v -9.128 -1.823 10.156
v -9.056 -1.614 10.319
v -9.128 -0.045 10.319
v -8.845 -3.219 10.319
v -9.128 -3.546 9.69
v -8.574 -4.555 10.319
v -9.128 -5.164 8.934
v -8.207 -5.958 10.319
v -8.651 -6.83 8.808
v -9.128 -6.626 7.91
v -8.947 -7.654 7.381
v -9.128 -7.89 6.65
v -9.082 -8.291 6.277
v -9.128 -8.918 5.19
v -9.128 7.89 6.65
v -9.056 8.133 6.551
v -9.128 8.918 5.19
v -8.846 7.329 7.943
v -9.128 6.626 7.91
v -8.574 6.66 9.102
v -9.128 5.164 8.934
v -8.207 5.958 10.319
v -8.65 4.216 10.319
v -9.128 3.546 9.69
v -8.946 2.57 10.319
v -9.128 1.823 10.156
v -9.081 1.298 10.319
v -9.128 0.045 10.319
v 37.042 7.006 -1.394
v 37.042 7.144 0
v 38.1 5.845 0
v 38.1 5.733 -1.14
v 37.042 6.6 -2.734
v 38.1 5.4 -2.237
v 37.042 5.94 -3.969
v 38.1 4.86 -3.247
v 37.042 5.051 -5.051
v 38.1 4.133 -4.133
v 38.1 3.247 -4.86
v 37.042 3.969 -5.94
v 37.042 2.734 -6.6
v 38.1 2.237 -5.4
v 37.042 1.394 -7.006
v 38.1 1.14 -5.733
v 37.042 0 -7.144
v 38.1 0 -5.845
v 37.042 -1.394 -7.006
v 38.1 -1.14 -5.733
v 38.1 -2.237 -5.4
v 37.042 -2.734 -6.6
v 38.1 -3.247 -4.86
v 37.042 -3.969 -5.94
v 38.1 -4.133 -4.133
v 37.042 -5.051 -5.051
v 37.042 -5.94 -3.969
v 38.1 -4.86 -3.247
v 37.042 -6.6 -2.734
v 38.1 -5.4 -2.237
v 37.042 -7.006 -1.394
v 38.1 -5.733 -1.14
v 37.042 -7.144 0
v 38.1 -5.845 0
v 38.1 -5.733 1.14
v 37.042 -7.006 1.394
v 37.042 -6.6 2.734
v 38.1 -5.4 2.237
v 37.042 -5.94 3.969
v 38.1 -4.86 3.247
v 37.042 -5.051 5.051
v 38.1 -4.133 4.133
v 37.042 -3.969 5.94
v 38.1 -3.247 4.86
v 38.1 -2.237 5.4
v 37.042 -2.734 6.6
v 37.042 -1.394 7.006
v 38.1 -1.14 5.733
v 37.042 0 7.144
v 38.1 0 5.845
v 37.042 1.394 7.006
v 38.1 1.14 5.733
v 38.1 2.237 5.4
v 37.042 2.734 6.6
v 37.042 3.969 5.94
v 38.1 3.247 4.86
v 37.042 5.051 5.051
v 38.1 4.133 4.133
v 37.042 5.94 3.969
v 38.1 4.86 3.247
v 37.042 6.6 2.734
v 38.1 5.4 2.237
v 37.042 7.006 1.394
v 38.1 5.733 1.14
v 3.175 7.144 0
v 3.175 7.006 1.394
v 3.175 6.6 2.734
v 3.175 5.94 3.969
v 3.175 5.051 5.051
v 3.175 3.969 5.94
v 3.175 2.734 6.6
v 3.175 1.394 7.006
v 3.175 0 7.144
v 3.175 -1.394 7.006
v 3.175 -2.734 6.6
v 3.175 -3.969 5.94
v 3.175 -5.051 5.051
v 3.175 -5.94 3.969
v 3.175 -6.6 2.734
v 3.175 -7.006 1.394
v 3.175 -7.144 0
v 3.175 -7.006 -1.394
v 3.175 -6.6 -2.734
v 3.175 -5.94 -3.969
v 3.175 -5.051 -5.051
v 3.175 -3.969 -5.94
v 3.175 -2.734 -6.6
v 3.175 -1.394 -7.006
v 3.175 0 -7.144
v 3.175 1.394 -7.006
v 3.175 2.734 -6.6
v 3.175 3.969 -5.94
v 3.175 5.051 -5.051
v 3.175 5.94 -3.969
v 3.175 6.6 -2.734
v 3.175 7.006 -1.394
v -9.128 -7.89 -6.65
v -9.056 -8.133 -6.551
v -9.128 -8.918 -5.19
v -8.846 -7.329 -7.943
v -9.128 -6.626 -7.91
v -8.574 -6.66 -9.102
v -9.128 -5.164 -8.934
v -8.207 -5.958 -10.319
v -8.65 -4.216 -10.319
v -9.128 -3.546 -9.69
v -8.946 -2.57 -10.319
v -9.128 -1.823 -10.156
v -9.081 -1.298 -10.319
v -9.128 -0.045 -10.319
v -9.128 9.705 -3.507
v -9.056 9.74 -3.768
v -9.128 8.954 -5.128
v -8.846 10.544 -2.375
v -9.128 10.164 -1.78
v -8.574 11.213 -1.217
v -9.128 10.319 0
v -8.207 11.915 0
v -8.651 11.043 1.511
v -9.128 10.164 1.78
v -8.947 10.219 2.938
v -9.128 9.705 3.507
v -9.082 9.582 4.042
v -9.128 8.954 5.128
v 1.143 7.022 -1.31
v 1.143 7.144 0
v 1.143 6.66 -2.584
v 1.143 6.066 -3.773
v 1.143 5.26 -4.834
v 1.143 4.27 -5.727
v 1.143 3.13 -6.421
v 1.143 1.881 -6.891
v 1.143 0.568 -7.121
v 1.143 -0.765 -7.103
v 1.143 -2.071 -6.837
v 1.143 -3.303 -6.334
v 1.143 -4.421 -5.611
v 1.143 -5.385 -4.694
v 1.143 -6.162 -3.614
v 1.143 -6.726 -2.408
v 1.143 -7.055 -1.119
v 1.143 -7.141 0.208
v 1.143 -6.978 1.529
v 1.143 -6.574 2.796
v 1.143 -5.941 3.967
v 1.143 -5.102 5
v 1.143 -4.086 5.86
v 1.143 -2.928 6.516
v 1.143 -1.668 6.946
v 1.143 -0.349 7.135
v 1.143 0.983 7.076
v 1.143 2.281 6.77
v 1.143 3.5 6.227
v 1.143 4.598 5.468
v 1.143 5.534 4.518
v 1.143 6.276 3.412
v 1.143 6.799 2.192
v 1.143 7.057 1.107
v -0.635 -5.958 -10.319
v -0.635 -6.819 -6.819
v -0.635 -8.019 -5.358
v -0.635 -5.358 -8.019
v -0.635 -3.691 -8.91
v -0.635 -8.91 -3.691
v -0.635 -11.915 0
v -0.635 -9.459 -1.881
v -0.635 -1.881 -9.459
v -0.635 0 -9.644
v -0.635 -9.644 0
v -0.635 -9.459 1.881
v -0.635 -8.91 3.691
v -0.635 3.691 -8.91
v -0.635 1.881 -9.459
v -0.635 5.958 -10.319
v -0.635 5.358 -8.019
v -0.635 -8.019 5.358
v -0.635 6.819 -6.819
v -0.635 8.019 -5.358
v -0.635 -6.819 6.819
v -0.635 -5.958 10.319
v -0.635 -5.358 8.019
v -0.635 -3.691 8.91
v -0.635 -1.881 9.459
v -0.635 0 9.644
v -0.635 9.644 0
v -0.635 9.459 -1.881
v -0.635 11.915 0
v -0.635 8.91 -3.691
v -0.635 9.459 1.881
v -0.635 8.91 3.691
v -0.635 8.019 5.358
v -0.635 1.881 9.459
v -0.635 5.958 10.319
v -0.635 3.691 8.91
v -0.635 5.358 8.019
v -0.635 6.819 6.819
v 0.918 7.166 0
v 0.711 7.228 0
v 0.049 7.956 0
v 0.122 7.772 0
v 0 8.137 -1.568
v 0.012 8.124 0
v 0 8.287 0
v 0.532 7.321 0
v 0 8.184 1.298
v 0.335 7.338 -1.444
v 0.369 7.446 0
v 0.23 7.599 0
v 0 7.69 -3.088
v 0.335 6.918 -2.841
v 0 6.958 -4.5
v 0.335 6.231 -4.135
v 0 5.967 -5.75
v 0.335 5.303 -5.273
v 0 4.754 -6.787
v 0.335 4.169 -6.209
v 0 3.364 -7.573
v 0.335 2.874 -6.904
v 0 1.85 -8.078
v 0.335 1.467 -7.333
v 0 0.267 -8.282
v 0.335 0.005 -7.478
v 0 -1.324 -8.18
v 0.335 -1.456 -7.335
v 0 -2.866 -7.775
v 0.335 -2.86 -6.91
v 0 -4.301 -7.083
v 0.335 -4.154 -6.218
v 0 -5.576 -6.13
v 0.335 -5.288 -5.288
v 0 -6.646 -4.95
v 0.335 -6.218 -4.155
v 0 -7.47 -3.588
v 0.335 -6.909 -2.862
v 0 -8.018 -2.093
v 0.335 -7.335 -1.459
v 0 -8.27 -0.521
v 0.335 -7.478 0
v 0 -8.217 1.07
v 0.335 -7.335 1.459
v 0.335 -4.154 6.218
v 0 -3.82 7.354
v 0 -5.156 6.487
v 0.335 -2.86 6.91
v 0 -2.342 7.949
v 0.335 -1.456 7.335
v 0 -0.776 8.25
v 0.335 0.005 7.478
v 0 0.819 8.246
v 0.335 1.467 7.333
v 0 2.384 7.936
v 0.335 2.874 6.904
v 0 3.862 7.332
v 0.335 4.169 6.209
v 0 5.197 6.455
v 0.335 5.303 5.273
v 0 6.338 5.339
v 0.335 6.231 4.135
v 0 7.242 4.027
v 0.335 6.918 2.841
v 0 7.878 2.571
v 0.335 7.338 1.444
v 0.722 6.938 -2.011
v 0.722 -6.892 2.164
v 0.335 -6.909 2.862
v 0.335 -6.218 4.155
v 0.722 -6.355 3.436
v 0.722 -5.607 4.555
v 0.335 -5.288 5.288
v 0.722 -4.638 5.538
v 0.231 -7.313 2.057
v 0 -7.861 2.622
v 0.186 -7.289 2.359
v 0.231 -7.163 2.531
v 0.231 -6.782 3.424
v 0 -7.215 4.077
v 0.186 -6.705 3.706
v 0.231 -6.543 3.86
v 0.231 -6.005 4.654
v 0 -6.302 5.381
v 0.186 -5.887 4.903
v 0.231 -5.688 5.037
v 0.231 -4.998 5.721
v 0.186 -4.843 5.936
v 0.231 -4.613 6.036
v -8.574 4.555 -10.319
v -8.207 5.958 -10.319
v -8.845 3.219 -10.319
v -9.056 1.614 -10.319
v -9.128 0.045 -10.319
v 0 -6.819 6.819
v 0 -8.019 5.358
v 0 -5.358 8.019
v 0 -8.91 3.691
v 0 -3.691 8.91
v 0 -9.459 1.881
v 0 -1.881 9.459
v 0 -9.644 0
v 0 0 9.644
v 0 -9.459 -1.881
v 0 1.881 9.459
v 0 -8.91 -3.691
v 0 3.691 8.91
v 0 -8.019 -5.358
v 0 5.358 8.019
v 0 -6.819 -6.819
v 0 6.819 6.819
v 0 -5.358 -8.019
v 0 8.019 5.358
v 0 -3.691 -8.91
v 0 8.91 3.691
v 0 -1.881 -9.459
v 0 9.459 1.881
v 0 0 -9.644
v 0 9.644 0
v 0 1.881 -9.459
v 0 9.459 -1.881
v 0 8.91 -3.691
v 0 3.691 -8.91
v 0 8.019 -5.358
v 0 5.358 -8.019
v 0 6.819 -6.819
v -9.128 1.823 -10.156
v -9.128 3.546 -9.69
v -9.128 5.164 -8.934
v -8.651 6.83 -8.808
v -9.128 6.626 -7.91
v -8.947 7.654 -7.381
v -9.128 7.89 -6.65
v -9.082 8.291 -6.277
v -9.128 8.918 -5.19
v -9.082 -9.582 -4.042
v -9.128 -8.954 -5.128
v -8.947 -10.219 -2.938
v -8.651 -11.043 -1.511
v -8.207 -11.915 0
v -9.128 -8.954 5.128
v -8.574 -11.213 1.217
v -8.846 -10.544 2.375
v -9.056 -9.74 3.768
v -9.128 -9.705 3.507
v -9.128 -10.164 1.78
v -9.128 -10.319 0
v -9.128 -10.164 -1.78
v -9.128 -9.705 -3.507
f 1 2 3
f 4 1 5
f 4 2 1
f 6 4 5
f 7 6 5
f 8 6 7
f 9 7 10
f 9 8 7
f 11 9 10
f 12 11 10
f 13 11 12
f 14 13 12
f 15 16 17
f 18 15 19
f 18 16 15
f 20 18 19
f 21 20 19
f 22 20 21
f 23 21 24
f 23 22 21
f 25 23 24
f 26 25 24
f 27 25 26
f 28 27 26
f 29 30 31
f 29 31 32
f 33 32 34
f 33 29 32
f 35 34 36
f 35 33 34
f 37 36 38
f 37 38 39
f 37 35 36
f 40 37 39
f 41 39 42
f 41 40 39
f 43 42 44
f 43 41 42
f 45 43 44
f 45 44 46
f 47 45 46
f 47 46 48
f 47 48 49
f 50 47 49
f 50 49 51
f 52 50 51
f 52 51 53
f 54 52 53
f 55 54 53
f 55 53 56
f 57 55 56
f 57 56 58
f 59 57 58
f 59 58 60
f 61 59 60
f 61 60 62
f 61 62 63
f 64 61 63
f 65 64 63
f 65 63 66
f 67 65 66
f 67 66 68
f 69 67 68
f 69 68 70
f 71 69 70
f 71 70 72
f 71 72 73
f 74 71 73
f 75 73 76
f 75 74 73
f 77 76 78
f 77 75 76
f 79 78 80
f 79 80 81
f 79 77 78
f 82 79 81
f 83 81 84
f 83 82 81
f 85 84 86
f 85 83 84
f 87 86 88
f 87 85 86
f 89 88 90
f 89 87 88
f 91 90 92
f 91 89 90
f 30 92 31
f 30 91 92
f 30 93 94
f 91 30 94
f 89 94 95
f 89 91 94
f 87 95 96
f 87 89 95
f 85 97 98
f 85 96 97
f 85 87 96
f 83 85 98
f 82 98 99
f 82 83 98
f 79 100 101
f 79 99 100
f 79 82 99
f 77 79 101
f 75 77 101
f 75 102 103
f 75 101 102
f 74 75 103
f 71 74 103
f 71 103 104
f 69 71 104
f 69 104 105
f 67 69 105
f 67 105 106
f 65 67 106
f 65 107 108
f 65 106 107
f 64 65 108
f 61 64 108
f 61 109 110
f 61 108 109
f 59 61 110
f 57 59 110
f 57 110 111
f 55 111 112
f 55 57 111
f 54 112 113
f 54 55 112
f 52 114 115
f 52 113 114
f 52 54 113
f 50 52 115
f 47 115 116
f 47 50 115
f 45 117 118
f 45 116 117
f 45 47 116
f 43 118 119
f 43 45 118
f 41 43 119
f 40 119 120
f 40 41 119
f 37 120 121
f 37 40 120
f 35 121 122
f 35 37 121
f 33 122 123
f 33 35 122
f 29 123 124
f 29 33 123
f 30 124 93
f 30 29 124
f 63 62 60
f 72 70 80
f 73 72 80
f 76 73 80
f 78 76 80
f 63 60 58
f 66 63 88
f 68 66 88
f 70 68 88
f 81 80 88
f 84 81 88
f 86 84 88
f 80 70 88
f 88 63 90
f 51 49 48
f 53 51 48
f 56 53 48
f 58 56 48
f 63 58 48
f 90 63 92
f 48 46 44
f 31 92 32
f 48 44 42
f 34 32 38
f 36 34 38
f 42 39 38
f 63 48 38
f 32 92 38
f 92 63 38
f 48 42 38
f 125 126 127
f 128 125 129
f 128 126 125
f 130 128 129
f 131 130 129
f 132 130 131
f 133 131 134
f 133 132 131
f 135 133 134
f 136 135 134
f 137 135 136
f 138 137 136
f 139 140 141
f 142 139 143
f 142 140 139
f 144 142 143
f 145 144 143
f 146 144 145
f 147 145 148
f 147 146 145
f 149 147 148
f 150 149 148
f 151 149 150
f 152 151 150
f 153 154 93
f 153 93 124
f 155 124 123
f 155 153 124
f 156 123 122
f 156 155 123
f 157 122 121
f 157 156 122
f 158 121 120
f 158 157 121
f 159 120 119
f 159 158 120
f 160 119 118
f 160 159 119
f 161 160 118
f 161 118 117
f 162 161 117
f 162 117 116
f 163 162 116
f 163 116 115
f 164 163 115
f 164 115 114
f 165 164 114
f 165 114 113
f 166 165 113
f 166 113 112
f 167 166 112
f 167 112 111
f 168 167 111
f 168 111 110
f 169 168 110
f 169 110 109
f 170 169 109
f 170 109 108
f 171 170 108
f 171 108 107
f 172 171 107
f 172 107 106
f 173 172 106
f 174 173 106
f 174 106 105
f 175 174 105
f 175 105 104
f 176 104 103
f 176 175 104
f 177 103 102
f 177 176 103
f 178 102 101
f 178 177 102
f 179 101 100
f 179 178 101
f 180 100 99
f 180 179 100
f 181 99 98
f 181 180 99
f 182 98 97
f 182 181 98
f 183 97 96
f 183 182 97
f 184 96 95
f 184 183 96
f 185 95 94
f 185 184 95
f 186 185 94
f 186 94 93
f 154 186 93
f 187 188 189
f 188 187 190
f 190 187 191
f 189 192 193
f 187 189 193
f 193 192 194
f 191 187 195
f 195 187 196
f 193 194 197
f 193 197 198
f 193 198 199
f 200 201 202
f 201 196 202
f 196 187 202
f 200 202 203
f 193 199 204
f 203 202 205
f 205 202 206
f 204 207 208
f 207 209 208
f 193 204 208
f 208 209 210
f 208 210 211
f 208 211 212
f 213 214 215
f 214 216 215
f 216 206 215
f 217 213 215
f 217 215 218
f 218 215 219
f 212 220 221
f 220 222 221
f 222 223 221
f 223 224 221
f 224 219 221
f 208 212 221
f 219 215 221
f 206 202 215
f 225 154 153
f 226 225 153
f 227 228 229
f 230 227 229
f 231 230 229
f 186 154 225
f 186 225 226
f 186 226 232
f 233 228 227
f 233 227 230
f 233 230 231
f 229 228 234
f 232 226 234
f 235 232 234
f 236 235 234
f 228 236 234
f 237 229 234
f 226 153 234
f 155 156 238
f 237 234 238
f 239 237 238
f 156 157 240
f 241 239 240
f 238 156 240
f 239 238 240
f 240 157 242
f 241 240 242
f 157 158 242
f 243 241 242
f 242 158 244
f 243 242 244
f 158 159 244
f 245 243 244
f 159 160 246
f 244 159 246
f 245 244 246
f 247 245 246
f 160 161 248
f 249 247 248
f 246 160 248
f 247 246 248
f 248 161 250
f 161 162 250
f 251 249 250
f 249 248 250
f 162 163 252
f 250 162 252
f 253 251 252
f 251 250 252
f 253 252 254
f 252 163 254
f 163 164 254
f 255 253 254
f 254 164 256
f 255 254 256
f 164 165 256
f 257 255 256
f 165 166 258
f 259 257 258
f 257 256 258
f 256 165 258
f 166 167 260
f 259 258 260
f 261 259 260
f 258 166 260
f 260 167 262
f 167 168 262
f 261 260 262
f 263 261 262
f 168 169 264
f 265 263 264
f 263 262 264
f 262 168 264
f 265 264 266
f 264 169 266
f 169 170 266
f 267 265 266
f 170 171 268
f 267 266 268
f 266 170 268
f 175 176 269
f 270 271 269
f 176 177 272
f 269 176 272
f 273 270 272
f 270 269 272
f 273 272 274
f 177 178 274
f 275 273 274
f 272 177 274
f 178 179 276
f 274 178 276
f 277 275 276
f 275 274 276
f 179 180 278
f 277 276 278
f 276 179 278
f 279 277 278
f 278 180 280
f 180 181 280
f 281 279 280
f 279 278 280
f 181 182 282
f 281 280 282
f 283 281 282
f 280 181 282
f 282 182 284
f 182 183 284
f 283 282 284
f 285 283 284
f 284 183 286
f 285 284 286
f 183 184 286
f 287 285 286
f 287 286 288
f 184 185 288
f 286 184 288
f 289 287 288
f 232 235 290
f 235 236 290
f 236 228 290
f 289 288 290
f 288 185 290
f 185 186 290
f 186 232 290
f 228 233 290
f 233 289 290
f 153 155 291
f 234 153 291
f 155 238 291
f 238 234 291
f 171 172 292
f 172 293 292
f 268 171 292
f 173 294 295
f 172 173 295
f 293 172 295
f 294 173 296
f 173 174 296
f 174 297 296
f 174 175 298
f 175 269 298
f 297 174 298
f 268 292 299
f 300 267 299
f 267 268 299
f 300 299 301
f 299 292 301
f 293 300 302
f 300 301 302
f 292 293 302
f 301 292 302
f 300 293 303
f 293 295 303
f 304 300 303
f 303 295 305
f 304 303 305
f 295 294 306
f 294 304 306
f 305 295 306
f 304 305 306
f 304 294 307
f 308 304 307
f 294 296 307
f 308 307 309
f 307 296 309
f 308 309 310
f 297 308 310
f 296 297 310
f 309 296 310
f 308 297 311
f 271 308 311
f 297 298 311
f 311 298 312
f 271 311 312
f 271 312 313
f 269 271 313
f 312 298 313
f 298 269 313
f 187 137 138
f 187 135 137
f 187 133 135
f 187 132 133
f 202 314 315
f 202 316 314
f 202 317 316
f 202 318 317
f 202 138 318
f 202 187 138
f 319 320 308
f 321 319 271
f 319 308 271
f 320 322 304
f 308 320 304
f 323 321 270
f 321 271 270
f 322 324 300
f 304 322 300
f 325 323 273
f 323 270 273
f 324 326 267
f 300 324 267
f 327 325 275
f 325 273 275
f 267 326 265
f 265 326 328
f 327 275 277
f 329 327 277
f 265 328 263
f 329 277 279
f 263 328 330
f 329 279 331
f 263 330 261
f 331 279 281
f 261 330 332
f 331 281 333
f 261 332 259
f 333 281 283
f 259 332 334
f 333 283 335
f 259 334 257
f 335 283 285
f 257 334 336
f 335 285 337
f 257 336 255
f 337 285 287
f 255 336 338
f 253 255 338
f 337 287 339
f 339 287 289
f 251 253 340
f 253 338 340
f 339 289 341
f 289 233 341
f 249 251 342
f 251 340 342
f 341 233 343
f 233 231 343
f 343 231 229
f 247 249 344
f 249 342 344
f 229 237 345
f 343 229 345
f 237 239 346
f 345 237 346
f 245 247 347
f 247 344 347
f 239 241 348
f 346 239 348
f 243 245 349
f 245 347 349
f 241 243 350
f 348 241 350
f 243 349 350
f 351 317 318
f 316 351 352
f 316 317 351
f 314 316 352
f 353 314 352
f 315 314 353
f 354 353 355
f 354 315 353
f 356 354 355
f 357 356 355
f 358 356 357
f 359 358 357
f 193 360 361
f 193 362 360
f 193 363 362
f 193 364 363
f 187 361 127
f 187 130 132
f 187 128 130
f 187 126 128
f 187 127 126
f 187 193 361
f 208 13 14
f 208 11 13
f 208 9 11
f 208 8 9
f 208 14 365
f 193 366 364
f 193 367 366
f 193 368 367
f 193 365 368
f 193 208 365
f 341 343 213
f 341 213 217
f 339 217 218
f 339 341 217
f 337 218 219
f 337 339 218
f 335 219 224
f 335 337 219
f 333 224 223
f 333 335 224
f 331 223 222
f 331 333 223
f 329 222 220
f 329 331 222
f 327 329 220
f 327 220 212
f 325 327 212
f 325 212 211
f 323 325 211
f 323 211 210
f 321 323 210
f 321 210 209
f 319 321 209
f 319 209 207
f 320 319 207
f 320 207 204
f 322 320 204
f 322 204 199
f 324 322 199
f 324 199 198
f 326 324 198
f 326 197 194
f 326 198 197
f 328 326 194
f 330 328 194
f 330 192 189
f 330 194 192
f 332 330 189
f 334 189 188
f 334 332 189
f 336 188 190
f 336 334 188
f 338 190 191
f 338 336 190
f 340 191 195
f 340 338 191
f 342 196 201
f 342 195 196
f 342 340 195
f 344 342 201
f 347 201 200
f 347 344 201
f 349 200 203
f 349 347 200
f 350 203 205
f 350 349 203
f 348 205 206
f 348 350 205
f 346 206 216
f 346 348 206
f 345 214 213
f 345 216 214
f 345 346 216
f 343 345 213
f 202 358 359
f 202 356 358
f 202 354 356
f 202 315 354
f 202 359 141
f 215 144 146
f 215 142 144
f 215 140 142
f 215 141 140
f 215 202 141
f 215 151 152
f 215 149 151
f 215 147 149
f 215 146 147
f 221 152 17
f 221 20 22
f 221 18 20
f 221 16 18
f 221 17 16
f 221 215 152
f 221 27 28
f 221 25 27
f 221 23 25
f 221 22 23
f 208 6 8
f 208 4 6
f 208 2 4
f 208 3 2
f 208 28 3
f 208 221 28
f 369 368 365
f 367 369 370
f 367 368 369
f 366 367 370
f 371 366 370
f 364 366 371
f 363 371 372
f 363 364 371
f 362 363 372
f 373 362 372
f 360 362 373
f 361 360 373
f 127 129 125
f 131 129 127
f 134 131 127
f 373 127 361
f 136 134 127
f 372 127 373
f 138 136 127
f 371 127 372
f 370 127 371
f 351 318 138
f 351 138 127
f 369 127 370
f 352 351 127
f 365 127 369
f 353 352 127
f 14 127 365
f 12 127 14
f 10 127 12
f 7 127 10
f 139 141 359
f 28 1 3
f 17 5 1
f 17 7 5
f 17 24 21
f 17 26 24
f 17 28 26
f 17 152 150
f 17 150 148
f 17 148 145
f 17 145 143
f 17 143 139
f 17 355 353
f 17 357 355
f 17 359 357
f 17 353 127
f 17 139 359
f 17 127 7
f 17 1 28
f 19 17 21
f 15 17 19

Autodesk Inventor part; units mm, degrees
ref_plane "YZ Plane" through (0, 0, 0) normal (1, 0, 0) x (0, 1, 0)
ref_plane "XZ Plane" through (0, 0, 0) normal (0, 1, 0) x (-1, 0, 0)
sketch "Sketch1" plane through (0, 0, 0) normal (0, 0, 1) x (1, 0, 0)
  line L0 (0, 9.6441) -> (0, 7.1437)
  line L1 (3.175, 7.1437) -> (38.1, 7.1438)
  line L2 (38.1, 7.1438) -> (38.1, 0)
  line L3 (38.1, 0) -> (-0.6351, 0)
  line L4 (-8.3821, 0) -> (45.847, 0) projected
  line L5 (-0.6351, 0) -> (-0.6351, 9.6441)
  line L6 (-0.6351, 9.6441) -> (0, 9.6441)
  line L7 (3.175, 7.1437) -> (1.0582, 7.1437)
  line L8 (1.0582, 7.1437) -> (0, 7.1437)
  line L9 (0, -1.9288) -> (0, 11.5729) projected
  dimension "d0" = 38.1
  dimension "d1" = 34.925
  dimension "d2" = 14.2875
  dimension "d9" = 0.6351
  dimension "d10" = 19.2881
  dimension "d13" = 2.1168
  dimension "d14" = 14.2875
revolve "Body" add sketch "Sketch1" angle 360 about axis through (38.1, 0, 0) along (-1, 0, 0)
sketch "Sketch2" plane through (-0.6351, 0, 0) normal (-1, 0, 0) x (0, 0, 1)
  line L0 (0, 11.9151) -> (10.3187, 5.9575)
  line L1 (10.3187, 5.9575) -> (10.3187, -5.9575)
  line L2 (10.3187, -5.9575) -> (0, -11.9151)
  line L3 (0, -11.9151) -> (-10.3187, -5.9575)
  line L4 (-10.3187, -5.9575) -> (-10.3187, 5.9575)
  line L5 (-10.3187, 5.9575) -> (0, 11.9151)
  point P0 (0, 0)
  point P1 (0, 0)
  dimension "d11" = 20.6375
extrude "Head" add sketch "Sketch2" along normal blind 8.4931
sketch "Sketch4" plane through (0, 0, 0) normal (0, 0, 1) x (1, 0, 0)
  line L0 (-9.1282, 10.3188) -> (-9.1282, 11.9151)
  line L1 (-9.1282, 11.9151) -> (-8.2066, 11.9151)
  line L2 (-8.2066, 11.9151) -> (-9.1282, 10.3188)
  line L3 (-10.8269, 0) -> (1.0635, 0) projected
  line L4 (-0.6351, 11.9151) -> (-9.1282, 11.9151) projected
  line L5 (-9.1282, 5.9575) -> (-9.1282, 11.9151) projected
  dimension "d5" = 30
  dimension "d19" = 20.6375
revolve "Chamfer1" cut sketch "Sketch4" angle 360 about axis through (-10, 0, 0) along (1, 0, 0)
thread "Thread" size "9/16-12 UNC" class "2A" standard "ANSI Unified Screw Threads" length 34.925
chamfer "Chamfer2" distance 1.2985 distance2 1.0584 1 edges at (38.1, -7.1437, 0) measured on face at (38.1, -1.2527, -0.5699)
ref_plane "Work Plane1" through (1.525, 0, 0) normal (0, 0, 1) x (1, 0, 0)
fillet "Fillet2" radius 1.143 1 edges at (0, -7.1437, 0)
equation "\"d0\" = NLG"
equation "\"d1\" = GEL"
equation "\"d2\" = GD"
equation "\"d10\" = SD2"
equation "\"d14\" = BDM"
equation "\"d11\" = SW"
equation "\"d3\" = KOH - SD"
equation "\"d5\" = ANG1"
equation "\"d19\" = SW0"
equation "\"d63\" = R"
equation "\"d15\" = GEL"
equation "\"d6\" = -0.5 * SPD + 0.5 * GD"
equation "\"NLG\" = 38.1"
equation "\"GD\" = NND"
equation "\"BDM\" = 14.2875"
equation "\"KOH\" = 9.12813"
equation "\"GEL\" = 34.925"
equation "\"SW\" = 20.6375"
equation "\"SW0\" = SW"
equation "\"SPD\" = 11.69055"
equation "\"SD2\" = 19.28813"
equation "\"SD\" = 0.635"
equation "\"ANG1\" = 30deg"
equation "\"GAL\" = 2.11667"
equation "\"GUL\" = 1.05833"
equation "\"R\" = 1.143"
equation "\"THREADDIA\" = 14.2875"
equation "\"TOA\" = 30deg"
equation "\"RR\" = 0.762"
equation "\"NND\" = 14.2875"
equation "\"E0\" = 1.155 * SW"
equation "\"SLG\" = 0"
equation "\"GD1\" = 11.69055"
properties part number "ANSI B18.2.1 - 9/16-12 UNC - 1.5, HCSI" material "Steel, Mild"
